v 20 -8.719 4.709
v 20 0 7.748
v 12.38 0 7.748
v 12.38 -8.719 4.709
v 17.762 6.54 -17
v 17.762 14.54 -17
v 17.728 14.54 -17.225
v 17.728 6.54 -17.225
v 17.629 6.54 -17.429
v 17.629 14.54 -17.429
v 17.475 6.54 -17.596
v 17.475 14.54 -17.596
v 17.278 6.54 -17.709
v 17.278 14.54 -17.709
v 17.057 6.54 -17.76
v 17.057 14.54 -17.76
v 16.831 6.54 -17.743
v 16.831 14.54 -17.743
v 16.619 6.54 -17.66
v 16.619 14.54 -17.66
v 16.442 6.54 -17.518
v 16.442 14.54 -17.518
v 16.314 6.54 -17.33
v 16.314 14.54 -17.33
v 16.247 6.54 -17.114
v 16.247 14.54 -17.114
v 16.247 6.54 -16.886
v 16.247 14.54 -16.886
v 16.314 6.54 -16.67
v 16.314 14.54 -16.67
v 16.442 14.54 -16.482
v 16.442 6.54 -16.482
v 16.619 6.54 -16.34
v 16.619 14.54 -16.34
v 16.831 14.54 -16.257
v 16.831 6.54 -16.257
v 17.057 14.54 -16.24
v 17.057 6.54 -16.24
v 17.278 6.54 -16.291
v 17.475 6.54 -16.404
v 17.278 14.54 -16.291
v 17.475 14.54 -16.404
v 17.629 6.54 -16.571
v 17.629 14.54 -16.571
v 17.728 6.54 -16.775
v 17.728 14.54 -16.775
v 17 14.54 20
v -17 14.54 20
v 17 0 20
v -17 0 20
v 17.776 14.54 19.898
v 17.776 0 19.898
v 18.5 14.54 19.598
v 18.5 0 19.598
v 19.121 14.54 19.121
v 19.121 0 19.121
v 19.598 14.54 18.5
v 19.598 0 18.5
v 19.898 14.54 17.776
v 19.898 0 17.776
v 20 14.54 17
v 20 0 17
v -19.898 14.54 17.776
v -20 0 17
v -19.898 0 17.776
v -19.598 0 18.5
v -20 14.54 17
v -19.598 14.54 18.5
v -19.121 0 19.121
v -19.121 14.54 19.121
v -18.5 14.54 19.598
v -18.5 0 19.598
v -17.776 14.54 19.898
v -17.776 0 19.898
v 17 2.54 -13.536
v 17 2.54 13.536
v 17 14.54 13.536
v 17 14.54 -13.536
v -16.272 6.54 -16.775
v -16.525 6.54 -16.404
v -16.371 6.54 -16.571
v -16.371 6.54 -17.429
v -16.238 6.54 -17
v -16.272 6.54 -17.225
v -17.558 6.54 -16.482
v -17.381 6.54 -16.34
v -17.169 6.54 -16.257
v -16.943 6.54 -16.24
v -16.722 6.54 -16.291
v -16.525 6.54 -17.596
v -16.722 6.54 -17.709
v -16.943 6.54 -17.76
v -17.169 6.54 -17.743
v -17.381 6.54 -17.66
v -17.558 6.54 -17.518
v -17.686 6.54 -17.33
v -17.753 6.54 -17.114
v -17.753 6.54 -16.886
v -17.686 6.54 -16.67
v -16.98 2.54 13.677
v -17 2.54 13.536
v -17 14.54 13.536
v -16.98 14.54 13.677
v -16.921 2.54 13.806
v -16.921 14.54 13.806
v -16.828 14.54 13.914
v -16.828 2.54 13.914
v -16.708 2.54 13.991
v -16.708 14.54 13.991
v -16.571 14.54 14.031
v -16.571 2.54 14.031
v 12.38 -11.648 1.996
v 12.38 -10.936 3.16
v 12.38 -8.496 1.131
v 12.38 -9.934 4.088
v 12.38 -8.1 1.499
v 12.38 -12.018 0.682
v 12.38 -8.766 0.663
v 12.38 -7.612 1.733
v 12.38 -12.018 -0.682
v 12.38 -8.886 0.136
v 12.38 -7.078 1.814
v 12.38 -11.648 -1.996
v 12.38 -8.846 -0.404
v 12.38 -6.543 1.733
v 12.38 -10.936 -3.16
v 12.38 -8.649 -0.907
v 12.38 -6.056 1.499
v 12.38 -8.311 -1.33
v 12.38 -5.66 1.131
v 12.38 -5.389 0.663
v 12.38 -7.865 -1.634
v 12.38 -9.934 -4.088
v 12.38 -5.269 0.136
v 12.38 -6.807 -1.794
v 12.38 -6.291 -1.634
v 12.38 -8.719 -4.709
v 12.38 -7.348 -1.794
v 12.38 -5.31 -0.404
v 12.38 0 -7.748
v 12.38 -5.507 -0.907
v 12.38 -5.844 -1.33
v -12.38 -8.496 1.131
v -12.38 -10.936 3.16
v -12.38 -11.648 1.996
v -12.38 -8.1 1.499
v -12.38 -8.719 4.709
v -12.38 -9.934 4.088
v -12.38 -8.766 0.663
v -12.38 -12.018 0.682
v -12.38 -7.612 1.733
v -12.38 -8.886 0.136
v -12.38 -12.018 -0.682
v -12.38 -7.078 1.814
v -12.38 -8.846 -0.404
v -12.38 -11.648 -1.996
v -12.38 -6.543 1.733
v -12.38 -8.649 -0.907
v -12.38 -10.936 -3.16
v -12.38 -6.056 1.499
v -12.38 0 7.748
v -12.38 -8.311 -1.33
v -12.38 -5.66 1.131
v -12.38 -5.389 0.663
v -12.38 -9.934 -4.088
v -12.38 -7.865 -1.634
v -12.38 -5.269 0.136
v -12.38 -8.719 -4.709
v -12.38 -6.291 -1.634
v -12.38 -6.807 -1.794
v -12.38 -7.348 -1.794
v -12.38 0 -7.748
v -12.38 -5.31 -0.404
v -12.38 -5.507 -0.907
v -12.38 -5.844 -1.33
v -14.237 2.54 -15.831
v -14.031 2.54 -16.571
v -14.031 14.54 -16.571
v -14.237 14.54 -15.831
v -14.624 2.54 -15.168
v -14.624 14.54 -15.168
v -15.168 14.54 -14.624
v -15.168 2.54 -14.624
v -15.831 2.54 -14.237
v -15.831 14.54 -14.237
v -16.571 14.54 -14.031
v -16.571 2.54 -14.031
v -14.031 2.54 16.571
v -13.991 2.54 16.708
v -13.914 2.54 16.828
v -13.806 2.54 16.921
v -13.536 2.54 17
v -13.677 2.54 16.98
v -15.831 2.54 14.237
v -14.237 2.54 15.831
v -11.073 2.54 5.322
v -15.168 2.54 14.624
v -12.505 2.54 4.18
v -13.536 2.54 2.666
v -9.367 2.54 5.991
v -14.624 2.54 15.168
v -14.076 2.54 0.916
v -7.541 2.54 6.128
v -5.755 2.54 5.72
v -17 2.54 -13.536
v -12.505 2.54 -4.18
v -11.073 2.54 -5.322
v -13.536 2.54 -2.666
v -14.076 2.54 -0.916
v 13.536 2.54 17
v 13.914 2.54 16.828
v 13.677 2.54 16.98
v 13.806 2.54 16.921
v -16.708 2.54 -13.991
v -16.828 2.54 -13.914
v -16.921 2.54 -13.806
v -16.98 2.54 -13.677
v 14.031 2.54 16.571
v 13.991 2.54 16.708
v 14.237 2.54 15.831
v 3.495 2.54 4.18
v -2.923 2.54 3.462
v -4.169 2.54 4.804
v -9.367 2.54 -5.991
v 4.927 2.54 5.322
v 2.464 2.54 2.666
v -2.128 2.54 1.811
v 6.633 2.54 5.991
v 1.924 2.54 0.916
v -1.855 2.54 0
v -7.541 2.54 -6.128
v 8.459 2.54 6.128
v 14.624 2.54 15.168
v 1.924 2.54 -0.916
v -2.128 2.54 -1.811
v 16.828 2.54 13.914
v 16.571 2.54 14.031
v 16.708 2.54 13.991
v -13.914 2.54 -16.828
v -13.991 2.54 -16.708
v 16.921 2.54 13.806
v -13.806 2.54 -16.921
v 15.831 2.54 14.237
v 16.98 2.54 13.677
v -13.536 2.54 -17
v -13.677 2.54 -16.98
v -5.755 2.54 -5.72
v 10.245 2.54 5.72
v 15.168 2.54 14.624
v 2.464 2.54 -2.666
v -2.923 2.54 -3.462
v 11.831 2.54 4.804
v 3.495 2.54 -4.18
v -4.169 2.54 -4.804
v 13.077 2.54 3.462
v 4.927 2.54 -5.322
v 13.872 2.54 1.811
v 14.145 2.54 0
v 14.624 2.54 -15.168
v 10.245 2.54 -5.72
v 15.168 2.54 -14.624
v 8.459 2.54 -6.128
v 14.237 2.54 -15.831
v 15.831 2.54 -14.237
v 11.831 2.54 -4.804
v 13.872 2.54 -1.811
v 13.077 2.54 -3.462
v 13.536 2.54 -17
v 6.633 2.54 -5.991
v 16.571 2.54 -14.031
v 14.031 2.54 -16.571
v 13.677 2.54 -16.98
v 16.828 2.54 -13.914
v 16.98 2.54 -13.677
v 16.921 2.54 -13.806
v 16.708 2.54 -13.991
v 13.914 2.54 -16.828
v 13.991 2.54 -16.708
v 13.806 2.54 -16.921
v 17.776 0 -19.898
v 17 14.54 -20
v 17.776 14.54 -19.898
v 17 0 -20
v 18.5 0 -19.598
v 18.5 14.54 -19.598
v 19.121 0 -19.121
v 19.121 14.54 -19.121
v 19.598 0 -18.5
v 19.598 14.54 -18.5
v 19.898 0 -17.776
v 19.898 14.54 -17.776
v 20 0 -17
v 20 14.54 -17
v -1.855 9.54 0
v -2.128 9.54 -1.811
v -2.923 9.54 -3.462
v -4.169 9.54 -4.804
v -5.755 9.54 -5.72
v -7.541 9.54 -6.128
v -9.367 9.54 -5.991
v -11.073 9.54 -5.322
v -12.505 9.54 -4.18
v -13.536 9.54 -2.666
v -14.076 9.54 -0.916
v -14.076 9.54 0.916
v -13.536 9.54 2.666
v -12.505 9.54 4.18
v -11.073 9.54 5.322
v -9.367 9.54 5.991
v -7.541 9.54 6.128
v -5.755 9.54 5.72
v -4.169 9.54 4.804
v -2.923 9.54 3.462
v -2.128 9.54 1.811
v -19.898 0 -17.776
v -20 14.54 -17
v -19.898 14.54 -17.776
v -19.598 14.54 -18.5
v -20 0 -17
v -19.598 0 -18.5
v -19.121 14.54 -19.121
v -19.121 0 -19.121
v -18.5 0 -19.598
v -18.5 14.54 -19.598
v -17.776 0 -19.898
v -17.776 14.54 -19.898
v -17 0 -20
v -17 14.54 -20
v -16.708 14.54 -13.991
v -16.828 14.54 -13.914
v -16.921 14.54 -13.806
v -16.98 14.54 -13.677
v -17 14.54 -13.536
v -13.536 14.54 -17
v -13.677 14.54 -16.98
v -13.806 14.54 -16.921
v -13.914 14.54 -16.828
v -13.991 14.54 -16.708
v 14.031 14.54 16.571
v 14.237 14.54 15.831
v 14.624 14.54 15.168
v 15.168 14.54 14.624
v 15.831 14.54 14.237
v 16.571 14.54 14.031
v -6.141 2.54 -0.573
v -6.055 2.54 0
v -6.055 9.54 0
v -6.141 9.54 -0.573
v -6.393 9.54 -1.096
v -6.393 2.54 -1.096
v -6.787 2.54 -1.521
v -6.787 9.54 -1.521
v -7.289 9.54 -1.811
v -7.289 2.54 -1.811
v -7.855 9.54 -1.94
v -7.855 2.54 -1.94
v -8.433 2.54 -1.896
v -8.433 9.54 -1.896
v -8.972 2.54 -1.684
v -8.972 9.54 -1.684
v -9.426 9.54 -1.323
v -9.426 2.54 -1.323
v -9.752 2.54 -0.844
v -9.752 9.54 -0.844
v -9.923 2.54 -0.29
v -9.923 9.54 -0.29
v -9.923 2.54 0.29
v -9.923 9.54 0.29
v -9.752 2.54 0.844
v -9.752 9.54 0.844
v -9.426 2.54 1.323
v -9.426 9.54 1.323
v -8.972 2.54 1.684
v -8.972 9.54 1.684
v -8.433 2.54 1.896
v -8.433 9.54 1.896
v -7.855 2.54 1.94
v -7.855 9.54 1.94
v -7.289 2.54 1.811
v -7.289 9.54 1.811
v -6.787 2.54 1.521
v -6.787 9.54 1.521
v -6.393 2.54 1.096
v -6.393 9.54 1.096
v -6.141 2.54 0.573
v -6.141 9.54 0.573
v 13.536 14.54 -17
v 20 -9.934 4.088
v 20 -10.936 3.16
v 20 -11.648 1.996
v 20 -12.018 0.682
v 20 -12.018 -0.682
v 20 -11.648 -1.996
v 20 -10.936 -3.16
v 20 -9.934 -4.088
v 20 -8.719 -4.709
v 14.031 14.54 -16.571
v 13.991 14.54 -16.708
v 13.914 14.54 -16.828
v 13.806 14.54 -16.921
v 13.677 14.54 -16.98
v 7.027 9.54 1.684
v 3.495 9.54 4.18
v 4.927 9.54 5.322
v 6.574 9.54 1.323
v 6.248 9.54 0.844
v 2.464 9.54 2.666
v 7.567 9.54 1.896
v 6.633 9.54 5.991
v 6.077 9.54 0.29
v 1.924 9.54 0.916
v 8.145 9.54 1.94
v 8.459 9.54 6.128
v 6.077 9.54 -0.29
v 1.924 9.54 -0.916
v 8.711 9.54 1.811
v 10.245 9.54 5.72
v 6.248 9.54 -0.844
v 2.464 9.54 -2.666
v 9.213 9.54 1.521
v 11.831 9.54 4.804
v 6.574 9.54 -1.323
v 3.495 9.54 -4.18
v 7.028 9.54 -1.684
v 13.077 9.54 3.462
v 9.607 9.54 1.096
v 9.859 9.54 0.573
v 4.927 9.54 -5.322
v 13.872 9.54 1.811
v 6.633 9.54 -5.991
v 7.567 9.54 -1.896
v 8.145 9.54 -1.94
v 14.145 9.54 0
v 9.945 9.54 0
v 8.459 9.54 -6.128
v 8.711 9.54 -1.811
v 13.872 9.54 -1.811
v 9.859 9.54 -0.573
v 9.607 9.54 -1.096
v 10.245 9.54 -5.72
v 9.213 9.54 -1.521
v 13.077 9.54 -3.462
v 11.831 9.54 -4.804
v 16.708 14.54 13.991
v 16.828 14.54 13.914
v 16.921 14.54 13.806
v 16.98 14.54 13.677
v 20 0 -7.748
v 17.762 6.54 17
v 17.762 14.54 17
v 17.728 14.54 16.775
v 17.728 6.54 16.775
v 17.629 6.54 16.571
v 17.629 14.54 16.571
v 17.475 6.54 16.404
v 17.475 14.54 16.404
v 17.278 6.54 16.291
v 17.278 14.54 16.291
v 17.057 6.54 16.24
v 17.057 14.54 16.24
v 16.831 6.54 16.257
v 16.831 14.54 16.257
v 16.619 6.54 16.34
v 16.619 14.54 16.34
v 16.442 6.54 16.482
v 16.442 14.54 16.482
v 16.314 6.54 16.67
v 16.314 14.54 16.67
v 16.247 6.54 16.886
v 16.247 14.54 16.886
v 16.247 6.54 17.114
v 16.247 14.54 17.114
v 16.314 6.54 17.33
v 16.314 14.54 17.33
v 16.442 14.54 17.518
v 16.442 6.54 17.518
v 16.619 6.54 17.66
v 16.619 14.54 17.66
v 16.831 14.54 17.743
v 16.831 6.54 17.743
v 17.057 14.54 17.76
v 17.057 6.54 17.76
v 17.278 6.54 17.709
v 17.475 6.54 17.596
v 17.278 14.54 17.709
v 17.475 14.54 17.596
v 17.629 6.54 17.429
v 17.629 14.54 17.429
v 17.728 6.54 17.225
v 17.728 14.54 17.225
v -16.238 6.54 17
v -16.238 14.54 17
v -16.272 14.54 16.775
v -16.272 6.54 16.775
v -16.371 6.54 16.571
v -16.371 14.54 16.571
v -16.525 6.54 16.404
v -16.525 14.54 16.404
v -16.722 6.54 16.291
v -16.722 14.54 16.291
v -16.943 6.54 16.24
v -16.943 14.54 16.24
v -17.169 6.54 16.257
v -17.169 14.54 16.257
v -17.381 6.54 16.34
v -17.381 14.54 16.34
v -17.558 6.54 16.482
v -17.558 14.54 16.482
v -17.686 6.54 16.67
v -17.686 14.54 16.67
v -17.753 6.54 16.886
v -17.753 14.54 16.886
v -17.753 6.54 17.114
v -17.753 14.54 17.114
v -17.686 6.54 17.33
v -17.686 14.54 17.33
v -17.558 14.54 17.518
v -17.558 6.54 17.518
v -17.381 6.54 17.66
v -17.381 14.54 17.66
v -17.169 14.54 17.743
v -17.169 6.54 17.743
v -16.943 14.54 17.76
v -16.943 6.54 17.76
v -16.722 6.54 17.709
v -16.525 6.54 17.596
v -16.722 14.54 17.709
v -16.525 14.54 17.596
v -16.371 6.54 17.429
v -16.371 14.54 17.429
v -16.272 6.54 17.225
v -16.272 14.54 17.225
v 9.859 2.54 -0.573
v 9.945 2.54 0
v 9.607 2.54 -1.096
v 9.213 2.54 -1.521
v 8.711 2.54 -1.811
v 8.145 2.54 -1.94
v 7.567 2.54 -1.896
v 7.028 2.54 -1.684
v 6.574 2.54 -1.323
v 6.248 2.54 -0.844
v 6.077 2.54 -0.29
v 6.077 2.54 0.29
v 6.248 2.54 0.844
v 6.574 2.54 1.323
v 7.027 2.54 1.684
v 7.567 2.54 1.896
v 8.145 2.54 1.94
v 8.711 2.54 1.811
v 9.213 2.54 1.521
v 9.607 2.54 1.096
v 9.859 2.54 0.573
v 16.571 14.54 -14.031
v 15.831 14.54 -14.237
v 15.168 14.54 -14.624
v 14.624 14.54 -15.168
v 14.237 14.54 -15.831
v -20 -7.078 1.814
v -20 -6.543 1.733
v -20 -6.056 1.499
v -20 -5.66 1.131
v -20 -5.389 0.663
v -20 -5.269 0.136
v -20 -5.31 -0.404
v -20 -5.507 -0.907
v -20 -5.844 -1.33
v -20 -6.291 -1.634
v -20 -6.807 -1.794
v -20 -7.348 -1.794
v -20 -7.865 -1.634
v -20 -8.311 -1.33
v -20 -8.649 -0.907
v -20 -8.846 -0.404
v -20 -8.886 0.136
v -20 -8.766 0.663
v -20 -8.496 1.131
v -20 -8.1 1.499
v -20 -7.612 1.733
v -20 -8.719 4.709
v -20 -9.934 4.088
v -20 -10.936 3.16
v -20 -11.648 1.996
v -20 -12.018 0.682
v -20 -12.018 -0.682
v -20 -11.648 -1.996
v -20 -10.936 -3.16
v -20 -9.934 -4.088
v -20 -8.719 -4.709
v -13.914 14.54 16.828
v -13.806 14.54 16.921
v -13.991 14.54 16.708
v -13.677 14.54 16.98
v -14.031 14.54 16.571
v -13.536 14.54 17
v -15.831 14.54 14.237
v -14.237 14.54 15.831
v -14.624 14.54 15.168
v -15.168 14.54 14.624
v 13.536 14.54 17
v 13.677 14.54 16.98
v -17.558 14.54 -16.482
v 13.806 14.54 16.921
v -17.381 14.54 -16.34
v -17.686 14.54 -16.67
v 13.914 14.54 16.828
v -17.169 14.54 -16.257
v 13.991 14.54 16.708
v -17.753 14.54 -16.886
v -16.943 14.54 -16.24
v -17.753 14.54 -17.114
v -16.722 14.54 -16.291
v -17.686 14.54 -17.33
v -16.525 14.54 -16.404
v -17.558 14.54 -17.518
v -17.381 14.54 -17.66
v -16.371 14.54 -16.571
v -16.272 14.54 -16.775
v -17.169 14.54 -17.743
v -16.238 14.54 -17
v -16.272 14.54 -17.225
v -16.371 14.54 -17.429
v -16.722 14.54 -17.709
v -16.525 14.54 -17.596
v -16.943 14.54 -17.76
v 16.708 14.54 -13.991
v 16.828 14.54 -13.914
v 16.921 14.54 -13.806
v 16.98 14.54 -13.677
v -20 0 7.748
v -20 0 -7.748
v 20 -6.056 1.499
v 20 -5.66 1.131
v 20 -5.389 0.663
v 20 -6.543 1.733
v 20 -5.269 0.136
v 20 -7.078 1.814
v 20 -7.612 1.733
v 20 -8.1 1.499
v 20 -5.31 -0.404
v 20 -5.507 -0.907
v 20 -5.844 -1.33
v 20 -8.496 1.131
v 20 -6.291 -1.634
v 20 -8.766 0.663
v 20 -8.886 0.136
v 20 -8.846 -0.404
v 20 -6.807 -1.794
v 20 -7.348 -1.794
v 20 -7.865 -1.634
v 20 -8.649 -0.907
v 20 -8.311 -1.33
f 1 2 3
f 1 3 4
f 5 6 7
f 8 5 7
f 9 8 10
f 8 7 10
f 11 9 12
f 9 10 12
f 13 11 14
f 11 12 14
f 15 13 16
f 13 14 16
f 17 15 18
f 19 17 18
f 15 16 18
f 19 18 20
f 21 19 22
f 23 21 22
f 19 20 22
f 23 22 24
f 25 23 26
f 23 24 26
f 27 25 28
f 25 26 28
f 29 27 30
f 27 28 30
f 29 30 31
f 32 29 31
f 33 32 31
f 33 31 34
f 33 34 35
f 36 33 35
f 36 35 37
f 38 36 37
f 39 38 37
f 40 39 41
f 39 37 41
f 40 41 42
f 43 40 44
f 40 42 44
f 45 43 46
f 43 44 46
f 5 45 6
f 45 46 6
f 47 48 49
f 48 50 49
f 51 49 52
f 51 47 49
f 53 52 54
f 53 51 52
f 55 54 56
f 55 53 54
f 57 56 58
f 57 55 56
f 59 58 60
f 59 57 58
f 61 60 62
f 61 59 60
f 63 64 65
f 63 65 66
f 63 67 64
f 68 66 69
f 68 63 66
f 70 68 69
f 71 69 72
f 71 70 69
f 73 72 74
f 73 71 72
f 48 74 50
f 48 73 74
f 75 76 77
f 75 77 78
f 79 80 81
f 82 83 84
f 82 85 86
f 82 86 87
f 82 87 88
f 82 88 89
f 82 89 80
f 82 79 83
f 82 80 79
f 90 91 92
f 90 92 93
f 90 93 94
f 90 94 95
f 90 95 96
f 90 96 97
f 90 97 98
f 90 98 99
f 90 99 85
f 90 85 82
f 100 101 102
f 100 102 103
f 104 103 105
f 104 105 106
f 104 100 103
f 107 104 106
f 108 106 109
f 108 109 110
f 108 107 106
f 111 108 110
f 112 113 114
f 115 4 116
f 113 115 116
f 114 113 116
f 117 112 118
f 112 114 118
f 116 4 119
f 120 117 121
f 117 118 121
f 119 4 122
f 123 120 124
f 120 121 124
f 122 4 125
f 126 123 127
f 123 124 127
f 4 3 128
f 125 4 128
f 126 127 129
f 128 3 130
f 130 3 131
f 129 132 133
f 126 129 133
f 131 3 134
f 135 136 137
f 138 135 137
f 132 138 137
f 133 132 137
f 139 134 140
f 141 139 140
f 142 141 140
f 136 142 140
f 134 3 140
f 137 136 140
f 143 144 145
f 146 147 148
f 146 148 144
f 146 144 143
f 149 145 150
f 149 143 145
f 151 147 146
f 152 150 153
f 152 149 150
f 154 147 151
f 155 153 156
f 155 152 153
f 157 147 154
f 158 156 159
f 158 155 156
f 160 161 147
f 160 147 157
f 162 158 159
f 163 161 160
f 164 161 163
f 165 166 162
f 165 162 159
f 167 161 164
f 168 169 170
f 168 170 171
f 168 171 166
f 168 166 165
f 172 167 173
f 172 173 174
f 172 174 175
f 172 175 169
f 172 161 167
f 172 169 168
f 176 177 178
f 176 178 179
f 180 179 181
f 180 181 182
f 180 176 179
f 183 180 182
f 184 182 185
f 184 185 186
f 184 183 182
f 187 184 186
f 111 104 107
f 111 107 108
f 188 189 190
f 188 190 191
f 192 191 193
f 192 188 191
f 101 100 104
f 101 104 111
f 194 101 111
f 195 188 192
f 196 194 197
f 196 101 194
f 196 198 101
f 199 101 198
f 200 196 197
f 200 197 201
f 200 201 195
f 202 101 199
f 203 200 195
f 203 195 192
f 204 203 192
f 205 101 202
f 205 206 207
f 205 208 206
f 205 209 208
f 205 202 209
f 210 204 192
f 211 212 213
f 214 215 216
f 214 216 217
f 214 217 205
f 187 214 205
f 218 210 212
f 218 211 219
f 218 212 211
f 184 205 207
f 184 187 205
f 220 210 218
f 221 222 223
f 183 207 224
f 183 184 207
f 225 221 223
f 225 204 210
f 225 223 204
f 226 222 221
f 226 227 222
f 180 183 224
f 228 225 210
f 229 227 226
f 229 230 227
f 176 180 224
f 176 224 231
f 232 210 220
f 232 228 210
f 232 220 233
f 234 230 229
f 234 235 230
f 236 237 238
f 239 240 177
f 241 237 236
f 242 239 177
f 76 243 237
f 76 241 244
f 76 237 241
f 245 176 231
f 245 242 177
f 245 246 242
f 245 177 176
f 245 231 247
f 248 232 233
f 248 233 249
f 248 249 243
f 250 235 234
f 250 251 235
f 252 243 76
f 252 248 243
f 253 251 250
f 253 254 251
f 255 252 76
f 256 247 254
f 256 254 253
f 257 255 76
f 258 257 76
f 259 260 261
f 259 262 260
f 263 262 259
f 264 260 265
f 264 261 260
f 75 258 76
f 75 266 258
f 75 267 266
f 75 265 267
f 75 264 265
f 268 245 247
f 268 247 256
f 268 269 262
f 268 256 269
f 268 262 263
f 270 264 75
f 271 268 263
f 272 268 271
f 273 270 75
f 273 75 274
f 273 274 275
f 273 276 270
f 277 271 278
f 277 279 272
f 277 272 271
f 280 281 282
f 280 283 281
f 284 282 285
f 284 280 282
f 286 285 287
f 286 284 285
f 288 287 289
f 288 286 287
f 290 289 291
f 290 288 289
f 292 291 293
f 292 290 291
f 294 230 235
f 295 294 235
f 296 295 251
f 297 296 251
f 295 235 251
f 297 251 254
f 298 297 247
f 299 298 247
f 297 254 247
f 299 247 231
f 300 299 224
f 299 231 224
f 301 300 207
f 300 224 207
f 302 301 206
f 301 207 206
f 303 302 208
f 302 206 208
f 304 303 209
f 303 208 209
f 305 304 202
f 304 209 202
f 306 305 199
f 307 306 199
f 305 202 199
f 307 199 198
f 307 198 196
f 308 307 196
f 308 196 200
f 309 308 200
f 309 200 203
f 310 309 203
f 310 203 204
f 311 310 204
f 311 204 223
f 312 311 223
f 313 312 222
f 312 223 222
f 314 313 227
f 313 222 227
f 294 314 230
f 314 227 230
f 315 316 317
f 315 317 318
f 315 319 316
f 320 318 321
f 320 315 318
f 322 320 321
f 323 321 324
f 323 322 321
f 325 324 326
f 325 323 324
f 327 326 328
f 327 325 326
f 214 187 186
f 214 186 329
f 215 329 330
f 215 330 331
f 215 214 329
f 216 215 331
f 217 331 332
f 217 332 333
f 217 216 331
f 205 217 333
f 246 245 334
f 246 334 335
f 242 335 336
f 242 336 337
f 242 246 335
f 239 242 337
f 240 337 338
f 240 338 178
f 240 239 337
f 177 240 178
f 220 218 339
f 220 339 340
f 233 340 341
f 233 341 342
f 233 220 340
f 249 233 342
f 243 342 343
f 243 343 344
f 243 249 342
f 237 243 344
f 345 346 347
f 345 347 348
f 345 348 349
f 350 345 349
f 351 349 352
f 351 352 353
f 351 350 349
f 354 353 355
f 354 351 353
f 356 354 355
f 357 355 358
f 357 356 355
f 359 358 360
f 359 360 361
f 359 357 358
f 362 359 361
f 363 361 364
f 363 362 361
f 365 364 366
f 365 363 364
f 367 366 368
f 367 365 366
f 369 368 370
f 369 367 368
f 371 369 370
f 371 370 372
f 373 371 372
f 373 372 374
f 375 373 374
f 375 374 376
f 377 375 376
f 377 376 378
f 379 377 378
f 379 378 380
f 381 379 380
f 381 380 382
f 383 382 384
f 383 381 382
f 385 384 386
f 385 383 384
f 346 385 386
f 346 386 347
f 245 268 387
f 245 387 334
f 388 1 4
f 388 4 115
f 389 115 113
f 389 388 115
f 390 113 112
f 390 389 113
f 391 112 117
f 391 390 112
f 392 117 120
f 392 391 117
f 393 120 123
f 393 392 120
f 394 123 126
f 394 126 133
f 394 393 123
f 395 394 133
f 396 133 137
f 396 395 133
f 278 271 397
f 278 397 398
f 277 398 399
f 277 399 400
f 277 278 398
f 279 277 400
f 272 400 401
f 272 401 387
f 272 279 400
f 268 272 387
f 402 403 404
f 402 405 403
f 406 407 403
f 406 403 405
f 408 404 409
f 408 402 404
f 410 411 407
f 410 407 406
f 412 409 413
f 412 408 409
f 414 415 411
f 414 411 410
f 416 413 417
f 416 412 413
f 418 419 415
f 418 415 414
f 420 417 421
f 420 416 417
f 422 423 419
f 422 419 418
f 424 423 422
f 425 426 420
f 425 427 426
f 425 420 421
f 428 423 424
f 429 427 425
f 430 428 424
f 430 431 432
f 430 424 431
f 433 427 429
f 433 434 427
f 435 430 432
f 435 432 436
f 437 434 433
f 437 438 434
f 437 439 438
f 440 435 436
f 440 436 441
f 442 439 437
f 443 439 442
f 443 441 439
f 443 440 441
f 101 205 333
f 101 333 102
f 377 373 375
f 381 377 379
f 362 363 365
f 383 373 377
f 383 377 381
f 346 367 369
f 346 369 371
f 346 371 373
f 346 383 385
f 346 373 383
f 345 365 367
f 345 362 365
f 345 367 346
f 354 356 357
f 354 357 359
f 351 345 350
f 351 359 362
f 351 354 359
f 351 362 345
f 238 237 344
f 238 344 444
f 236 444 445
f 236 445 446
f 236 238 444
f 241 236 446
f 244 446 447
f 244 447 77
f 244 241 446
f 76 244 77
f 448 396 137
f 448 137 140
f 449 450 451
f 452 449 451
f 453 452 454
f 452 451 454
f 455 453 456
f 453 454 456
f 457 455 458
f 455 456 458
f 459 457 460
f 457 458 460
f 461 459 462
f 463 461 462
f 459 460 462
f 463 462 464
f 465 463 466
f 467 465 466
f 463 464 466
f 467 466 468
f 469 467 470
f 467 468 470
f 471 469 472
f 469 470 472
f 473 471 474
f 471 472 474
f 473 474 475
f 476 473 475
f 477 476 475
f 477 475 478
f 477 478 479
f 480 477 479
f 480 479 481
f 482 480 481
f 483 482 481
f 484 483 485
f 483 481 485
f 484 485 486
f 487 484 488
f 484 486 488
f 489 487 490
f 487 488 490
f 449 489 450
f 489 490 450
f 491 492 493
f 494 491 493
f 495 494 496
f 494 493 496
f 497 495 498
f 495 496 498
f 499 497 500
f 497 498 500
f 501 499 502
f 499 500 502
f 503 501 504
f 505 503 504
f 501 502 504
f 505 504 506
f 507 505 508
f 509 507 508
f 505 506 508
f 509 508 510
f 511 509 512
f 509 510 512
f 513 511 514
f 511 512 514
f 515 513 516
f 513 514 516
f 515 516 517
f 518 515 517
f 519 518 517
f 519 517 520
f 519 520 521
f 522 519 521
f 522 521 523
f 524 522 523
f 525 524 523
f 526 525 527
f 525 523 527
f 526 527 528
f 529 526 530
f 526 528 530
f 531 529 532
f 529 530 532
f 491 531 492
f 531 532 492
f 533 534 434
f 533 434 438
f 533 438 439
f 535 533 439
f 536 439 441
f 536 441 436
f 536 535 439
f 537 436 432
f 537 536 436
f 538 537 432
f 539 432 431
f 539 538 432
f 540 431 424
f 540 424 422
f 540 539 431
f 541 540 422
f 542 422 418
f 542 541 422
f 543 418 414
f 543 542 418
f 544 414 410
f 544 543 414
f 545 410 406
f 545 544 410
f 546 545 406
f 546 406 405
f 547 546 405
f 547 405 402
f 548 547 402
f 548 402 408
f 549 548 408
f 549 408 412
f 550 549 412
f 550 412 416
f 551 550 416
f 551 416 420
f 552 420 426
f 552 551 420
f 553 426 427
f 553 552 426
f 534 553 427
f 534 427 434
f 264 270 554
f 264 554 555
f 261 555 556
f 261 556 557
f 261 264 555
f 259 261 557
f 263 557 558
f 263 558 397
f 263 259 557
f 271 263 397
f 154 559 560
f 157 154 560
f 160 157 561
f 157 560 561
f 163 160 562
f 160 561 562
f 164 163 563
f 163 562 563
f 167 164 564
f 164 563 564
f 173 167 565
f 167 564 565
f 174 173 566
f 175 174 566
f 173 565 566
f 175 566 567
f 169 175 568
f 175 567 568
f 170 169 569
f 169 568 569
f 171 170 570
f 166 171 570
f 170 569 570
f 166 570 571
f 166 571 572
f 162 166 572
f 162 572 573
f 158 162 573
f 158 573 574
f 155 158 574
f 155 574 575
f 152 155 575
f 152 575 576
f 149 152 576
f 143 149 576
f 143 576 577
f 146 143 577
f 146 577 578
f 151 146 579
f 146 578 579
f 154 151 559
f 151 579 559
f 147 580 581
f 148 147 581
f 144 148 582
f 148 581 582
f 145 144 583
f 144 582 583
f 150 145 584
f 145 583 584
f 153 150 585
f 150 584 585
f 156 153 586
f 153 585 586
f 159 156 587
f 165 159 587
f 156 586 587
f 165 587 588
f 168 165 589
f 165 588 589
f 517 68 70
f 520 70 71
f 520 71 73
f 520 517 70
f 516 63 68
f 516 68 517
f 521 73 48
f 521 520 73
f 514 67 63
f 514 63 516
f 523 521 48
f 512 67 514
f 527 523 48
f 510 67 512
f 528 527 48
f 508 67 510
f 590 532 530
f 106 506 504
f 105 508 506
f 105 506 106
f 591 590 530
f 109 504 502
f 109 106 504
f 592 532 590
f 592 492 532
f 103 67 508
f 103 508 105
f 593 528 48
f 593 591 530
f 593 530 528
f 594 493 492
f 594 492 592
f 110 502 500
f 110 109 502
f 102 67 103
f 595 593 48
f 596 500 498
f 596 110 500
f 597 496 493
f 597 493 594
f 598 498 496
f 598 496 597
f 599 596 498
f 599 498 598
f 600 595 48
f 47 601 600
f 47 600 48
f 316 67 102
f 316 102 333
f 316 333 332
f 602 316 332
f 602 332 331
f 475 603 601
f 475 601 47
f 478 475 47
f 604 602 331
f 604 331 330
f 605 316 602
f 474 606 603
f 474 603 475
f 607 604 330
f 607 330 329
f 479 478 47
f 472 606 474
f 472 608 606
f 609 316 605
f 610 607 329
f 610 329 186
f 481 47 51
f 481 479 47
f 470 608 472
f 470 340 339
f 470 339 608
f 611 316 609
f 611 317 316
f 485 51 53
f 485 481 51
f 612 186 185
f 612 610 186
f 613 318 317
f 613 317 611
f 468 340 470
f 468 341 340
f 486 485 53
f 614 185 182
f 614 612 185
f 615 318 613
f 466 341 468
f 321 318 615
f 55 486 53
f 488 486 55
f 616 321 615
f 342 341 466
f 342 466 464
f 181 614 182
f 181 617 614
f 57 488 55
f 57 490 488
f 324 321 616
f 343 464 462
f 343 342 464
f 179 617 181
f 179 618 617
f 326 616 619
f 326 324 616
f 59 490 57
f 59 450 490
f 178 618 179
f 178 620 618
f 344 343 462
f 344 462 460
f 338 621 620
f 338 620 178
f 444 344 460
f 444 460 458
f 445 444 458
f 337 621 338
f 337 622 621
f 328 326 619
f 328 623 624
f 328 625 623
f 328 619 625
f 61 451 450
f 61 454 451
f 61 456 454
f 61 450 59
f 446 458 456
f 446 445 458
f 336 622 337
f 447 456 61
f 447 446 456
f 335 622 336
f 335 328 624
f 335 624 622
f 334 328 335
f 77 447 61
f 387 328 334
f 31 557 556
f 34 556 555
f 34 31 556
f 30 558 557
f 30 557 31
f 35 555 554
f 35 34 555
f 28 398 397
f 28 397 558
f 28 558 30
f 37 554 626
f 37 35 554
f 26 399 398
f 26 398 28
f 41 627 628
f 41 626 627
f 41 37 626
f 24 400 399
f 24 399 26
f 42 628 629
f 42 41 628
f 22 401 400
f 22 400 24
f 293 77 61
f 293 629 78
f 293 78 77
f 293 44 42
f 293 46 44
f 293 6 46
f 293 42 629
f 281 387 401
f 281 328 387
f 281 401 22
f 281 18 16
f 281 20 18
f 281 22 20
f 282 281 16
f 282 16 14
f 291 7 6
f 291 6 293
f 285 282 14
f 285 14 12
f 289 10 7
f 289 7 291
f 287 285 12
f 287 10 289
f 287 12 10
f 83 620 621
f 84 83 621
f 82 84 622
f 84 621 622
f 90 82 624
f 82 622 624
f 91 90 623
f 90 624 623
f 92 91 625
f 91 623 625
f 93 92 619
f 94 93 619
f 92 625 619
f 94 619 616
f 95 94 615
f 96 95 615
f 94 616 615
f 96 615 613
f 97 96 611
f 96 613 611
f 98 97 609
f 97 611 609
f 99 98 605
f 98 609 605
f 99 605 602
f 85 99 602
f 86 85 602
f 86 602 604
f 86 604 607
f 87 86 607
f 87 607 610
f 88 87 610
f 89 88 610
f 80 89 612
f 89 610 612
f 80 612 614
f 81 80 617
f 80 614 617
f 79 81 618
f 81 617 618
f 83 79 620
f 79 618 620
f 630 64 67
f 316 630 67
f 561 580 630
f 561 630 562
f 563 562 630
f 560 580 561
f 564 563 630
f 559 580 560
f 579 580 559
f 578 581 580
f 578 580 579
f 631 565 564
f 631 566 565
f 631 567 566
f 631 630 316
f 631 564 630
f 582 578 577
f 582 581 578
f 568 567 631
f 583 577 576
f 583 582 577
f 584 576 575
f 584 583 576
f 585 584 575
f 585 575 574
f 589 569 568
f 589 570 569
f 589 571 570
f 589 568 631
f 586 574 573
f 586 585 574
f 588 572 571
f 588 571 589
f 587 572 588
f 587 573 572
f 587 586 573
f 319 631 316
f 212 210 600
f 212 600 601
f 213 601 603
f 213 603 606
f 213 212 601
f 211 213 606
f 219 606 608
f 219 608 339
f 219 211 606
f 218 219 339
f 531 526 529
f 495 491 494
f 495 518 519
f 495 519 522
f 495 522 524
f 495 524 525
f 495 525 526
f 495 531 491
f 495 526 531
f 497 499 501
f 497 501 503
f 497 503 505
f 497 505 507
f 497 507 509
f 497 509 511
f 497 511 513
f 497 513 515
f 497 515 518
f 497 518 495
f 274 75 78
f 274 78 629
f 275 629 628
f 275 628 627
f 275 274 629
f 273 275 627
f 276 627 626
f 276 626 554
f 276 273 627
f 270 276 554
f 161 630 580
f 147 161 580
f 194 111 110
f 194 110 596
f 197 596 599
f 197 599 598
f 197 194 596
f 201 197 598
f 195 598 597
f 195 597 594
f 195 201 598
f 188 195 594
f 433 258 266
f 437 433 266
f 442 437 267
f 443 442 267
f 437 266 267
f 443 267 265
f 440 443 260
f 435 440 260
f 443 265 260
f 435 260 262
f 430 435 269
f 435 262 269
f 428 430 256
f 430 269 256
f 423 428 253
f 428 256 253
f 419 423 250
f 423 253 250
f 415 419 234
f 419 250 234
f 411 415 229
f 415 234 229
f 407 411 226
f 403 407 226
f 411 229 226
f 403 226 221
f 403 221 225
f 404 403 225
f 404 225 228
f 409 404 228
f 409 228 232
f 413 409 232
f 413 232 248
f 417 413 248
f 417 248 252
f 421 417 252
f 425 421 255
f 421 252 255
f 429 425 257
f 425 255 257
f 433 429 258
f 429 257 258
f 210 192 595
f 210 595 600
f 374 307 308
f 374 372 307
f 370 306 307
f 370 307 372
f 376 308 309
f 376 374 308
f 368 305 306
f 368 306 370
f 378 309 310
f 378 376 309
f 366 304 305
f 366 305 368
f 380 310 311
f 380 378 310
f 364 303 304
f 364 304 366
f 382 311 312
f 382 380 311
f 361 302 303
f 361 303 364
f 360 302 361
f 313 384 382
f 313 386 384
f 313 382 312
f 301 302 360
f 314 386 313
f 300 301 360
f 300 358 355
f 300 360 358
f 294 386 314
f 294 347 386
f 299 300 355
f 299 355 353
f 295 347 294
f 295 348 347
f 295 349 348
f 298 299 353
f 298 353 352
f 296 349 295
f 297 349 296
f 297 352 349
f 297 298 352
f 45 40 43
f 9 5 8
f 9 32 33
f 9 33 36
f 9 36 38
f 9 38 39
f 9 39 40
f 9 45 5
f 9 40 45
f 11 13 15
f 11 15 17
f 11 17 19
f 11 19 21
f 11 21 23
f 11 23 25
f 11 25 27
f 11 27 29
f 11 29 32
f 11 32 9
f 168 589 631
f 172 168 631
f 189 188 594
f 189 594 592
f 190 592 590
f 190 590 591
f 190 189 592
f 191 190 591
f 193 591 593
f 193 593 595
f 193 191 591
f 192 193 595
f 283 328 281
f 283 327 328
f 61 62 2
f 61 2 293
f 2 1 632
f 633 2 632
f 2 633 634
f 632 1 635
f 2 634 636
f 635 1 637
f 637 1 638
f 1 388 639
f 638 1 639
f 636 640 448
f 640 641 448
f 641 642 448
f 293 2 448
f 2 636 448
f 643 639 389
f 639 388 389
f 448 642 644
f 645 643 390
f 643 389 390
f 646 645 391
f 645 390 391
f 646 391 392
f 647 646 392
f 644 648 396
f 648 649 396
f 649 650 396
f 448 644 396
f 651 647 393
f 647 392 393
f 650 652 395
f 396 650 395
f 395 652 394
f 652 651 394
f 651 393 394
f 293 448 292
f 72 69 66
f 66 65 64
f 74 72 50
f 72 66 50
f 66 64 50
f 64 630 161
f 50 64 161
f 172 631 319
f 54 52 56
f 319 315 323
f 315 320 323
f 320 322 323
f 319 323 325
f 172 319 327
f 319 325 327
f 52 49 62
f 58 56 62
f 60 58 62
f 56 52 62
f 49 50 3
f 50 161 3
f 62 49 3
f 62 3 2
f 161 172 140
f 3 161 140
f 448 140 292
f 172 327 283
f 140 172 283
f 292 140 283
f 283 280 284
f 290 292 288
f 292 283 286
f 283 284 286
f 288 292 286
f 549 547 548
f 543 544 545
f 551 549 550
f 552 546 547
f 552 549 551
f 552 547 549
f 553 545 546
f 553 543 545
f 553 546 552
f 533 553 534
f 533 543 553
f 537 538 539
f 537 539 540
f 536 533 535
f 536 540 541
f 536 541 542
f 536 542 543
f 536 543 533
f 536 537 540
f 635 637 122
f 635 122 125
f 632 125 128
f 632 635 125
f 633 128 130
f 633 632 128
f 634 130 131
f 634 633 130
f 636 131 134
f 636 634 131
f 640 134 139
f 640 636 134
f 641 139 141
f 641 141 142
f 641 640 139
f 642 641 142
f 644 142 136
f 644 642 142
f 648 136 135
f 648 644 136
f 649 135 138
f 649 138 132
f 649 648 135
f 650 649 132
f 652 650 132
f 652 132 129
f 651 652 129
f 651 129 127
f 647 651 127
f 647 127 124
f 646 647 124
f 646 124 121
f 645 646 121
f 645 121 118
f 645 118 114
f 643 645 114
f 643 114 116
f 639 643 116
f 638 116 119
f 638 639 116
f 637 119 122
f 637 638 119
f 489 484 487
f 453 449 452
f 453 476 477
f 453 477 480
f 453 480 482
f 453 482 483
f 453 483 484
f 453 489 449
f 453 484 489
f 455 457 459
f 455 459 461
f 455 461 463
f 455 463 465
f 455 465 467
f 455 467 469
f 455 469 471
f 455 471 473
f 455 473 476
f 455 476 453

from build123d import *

# Parameters (mm, degrees)
SKETCH1_W           = 40
SKETCH1_H           = 40
BOSS_EXTRUDE1_DEPTH = 2.54
SKETCH2_W           = 40
SKETCH2_H           = 40
BOSS_EXTRUDE2_DEPTH = 12
SKETCH4_R           = 1.813765306
BOSS_EXTRUDE4_DEPTH = 7.62
SKETCH9_R           = 6.145
SKETCH9_R_2         = 1.945
BOSS_EXTRUDE5_DEPTH = 7
FILLET1_R           = 3
SKETCH10_R          = 0.761723834
CUT_EXTRUDE1_DEPTH  = 8


with BuildPart() as part:
    # Sketch1 → Boss-Extrude1 (new body)
    with BuildSketch(Plane(origin=(0, 0, 0), x_dir=(1, 0, 0), z_dir=(0, 1, 0))):
        Rectangle(SKETCH1_W, SKETCH1_H)
    extrude(amount=BOSS_EXTRUDE1_DEPTH)

    # Sketch2 → Boss-Extrude2 (add)
    with BuildSketch(Plane(origin=(0, 2.54, 0), x_dir=(1, 0, 0), z_dir=(0, 1, 0))):
        Rectangle(SKETCH2_W, SKETCH2_H)
        with BuildLine():
            Line((-17, 13.535898385), (-17, -13.535898385))
            ThreePointArc((-17, -13.535898385), (-16.877964473, -13.86322522), (-16.571428571, -14.030770044))
            ThreePointArc((-16.571428571, -14.030770044), (-14.878679656, -14.878679656), (-14.030770044, -16.571428571))
            ThreePointArc((-14.030770044, -16.571428571), (-13.86322522, -16.877964473), (-13.535898385, -17))
            Line((-13.535898385, -17), (13.535898385, -17))
            ThreePointArc((13.535898385, -17), (13.86322522, -16.877964473), (14.030770044, -16.571428571))
            ThreePointArc((14.030770044, -16.571428571), (14.878679656, -14.878679656), (16.571428571, -14.030770044))
            ThreePointArc((16.571428571, -14.030770044), (16.877964473, -13.86322522), (17, -13.535898385))
            Line((17, -13.535898385), (17, 13.535898385))
            ThreePointArc((17, 13.535898385), (16.877964473, 13.86322522), (16.571428571, 14.030770044))
            ThreePointArc((16.571428571, 14.030770044), (14.878679656, 14.878679656), (14.030770044, 16.571428571))
            ThreePointArc((14.030770044, 16.571428571), (13.86322522, 16.877964473), (13.535898385, 17))
            Line((13.535898385, 17), (-13.535898385, 17))
            ThreePointArc((-13.535898385, 17), (-13.86322522, 16.877964473), (-14.030770044, 16.571428571))
            ThreePointArc((-14.030770044, 16.571428571), (-14.878679656, 14.878679656), (-16.571428571, 14.030770044))
            ThreePointArc((-16.571428571, 14.030770044), (-16.877964473, 13.86322522), (-17, 13.535898385))
        make_face(mode=Mode.SUBTRACT)
    extrude(amount=BOSS_EXTRUDE2_DEPTH)

    # Sketch4 → Boss-Extrude4 (add)
    with BuildSketch(Plane.ZY.offset(20)):
        with BuildLine():
            Line((7.748459825, 0), (4.708955343, -8.719310622))
            ThreePointArc((4.708955343, -8.719310622), (0, -12.064660663), (-4.708955343, -8.719310622))
            Line((-4.708955343, -8.719310622), (-7.748459825, 0))
            Line((-7.748459825, 0), (7.748459825, 0))
        make_face()
        with Locations((0, -7.077794281)):
            Circle(SKETCH4_R, mode=Mode.SUBTRACT)
    boss_extrude4 = extrude(amount=-BOSS_EXTRUDE4_DEPTH)

    # Mirror1: Boss-Extrude4 across plane
    add(boss_extrude4.mirror(Plane(origin=(0, 0, 0), x_dir=(0, 0, 1), z_dir=(1, 0, 0))))

    # Sketch9 → Boss-Extrude5 (add)
    with BuildSketch(Plane(origin=(0, 2.54, 0), x_dir=(1, 0, 0), z_dir=(0, 1, 0))):
        with Locations((8, 0)):
            Circle(SKETCH9_R)
        with Locations((8, 0)):
            Circle(SKETCH9_R_2, mode=Mode.SUBTRACT)
        with Locations((-8, 0)):
            Circle(SKETCH9_R)
        with Locations((-8, 0)):
            Circle(SKETCH9_R_2, mode=Mode.SUBTRACT)
    extrude(amount=BOSS_EXTRUDE5_DEPTH)

    # Fillet1
    fillet1_edges = [part.edges().sort_by_distance(p)[0] for p in [
        (20, 7.27, 20),
        (-20, 7.27, 20),
        (-20, 7.27, -20),
        (20, 7.27, -20),
    ]]
    fillet(fillet1_edges, radius=FILLET1_R)

    # Sketch10 → Cut-Extrude1 (cut)
    with BuildSketch(Plane(origin=(0, 14.54, 0), x_dir=(1, 0, 0), z_dir=(0, 1, 0))):
        with Locations((-17, 17)):
            Circle(SKETCH10_R)
        with Locations((17, 17)):
            Circle(SKETCH10_R)
        with Locations((-17, -17)):
            Circle(SKETCH10_R)
        with Locations((17, -17)):
            Circle(SKETCH10_R)
    extrude(amount=-CUT_EXTRUDE1_DEPTH, mode=Mode.SUBTRACT)


solid = part.part
